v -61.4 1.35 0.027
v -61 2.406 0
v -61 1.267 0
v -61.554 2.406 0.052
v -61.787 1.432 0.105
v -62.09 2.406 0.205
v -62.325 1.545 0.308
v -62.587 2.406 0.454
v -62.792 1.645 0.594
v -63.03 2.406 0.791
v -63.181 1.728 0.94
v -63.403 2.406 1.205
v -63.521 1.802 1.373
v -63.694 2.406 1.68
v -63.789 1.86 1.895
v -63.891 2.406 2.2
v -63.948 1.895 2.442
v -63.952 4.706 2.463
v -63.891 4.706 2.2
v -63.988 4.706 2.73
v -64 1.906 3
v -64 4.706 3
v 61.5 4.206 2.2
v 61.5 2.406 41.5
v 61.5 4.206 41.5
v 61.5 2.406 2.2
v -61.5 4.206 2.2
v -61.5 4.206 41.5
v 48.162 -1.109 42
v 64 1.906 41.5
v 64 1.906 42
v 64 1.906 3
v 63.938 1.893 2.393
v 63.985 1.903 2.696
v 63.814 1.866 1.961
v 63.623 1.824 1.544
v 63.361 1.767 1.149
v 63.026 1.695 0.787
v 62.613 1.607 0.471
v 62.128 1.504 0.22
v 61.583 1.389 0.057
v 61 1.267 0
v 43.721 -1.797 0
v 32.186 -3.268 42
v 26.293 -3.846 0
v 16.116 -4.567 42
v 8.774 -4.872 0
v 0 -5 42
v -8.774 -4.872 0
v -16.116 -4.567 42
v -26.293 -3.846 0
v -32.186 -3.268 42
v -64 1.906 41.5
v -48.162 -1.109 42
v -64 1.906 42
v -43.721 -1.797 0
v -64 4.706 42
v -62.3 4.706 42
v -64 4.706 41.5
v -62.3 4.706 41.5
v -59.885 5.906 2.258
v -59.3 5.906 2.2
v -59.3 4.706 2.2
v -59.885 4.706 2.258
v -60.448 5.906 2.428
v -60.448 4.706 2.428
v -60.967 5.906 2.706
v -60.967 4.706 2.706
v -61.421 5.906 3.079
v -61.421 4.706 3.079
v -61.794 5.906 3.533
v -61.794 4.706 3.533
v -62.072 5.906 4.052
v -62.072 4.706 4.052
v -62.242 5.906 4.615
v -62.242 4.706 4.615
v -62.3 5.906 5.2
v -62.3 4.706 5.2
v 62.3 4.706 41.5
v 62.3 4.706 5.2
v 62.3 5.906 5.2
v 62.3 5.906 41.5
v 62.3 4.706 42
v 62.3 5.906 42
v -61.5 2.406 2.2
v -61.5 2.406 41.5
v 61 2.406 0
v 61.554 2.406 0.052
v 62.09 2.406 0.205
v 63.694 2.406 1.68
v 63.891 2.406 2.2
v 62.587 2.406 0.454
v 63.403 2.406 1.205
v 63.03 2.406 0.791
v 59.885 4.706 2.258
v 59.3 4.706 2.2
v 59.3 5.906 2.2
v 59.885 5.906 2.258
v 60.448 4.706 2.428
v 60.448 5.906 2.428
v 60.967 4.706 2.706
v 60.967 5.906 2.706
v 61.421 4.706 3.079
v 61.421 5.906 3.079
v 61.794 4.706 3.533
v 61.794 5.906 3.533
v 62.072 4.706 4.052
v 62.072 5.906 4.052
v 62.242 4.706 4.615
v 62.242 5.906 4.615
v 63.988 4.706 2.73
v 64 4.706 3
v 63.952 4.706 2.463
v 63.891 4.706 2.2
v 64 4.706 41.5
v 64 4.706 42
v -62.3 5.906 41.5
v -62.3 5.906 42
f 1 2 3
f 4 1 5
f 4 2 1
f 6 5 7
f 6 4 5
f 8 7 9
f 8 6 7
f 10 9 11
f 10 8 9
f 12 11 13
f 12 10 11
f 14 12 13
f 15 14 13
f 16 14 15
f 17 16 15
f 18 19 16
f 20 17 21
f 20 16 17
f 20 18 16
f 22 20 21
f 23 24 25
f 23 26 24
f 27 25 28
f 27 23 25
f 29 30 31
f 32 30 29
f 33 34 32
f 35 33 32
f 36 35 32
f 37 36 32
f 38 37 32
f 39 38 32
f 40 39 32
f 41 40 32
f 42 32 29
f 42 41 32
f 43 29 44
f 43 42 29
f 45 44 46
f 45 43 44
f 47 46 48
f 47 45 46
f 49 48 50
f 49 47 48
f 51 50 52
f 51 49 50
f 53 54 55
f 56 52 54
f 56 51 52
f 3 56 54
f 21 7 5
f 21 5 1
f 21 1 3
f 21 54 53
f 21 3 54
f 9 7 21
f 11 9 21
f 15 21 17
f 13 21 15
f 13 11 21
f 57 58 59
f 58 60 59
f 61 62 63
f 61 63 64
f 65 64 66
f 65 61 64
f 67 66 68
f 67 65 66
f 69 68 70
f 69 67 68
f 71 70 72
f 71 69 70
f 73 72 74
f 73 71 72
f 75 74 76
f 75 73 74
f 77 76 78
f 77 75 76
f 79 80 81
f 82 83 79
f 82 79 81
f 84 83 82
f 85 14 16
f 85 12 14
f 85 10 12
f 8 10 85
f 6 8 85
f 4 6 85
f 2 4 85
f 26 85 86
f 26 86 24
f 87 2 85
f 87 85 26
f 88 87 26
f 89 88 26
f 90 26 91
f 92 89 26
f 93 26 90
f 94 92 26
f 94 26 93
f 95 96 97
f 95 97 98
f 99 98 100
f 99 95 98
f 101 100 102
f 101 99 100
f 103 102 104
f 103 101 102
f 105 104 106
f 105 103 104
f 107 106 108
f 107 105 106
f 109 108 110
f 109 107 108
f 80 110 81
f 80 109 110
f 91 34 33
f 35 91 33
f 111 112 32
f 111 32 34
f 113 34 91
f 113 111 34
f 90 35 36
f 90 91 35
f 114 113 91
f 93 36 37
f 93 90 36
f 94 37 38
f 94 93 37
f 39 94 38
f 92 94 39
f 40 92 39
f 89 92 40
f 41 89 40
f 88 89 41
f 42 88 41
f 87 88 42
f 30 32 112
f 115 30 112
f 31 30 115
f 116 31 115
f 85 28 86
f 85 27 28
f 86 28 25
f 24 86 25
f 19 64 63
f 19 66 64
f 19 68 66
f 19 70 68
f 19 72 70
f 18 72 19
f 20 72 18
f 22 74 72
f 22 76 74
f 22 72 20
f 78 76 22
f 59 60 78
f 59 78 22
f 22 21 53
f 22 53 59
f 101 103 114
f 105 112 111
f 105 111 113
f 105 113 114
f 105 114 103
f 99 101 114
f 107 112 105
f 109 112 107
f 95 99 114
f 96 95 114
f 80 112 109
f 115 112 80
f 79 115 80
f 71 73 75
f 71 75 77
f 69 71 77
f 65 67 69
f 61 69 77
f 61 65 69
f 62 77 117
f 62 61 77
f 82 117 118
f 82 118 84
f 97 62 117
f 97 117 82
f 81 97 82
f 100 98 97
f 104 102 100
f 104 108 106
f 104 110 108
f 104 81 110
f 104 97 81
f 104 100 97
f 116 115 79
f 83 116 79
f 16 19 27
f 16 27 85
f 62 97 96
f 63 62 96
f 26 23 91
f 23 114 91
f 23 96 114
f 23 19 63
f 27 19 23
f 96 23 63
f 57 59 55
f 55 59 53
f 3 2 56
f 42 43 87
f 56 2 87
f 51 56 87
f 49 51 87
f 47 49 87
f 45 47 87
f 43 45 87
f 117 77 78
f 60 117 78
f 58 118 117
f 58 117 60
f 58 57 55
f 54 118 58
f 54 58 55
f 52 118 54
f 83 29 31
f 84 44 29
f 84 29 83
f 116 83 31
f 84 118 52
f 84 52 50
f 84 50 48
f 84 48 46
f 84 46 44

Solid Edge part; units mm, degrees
sketch "Sketch1" plane through (0, 0, 0) normal (0, 0, 1) x (1, 0, 0)
  arc A0 (-64, 1.9062) -> (64, 1.9062) centre (0, 295) ccw
  line L0 (64, 1.9062) -> (64, 5.9062)
  line L1 (-64, 5.9062) -> (64, 5.9062)
  line L2 (-64, 1.9062) -> (-64, 5.9062)
extrude "Protrusion1" add sketch "Sketch1" along normal blind 41.5
fillet "Verrundung_1" radius 3 1 edges at (-64, 3.9062, 0)
fillet "Verrundung_2" radius 3 1 edges at (64, 3.9062, 0)
sketch "Sketch2" plane through (0, -1.119, 41.5) normal (0, 0, 1) x (1, 0, 0)
  line L0 (-62.3, 7.0251) -> (-62.3, 5.8251)
  line L1 (-62.3, 5.8251) -> (-64, 5.8251)
  line L2 (-64, 5.8251) -> (-64, 7.0251)
  line L3 (-64, 7.0251) -> (-62.3, 7.0251)
  line L4 (64, 7.0251) -> (64, 5.8251)
  line L5 (64, 5.8251) -> (62.3, 5.8251)
  line L6 (62.3, 5.8251) -> (62.3, 7.0251)
  line L7 (62.3, 7.0251) -> (64, 7.0251)
extrude "Extrusionsausschnitt_1" cut sketch "Sketch2" against normal blind 45
sketch "Sketch3" plane through (0, 0.4531, 0) normal (0, 0, -1) x (1, 0, 0)
  line L0 (-61.5, -1.9531) -> (61.5, -1.9531)
  line L1 (61.5, -1.9531) -> (61.5, -3.7531)
  line L2 (61.5, -3.7531) -> (-61.5, -3.7531)
  line L3 (-61.5, -3.7531) -> (-61.5, -1.9531)
extrude "Extrusionsausschnitt_2" cut sketch "Sketch3" against normal blind 554.4
sketch "Sketch4" plane through (-62.3, 5.3062, 21.6481) normal (-1, 0, 0) x (0, 0, 1)
  line L0 (-21.6481, 0.6) -> (-19.4481, 0.6)
  line L1 (-19.4481, 0.6) -> (-19.4481, -2.9)
  line L2 (-21.6481, -2.9) -> (-19.4481, -2.9)
  line L3 (-21.6481, 0.6) -> (-21.6481, -2.9)
extrude "Extrusionsausschnitt_3" cut sketch "Sketch4" along normal blind 28.8 and the other way blind 145.8
fillet "Verrundung_3" radius 3 2 edges at (-62.3, 5.3062, 2.2) (62.3, 5.3062, 2.2)
sketch "Sketch5" plane through (0, 0.4531, 41.5) normal (0, 0, 1) x (1, 0, 0)
  line L0 (62.3, 5.4531) -> (-62.3, 5.4531)
  line L1 (-62.3, 5.4531) -> (-62.3, 4.2531)
  line L2 (-62.3, 4.2531) -> (-64, 4.2531)
  line L3 (-64, 4.2531) -> (-64, 1.4531)
  arc A0 (-64, 1.4531) -> (64, 1.4531) centre (0, 294.5469) ccw
  line L4 (64, 1.4531) -> (64, 4.2531)
  line L5 (64, 4.2531) -> (62.3, 4.2531)
  line L6 (62.3, 4.2531) -> (62.3, 5.4531)
extrude "Extrusionsausprägung_2" add sketch "Sketch5" along normal blind 0.5
